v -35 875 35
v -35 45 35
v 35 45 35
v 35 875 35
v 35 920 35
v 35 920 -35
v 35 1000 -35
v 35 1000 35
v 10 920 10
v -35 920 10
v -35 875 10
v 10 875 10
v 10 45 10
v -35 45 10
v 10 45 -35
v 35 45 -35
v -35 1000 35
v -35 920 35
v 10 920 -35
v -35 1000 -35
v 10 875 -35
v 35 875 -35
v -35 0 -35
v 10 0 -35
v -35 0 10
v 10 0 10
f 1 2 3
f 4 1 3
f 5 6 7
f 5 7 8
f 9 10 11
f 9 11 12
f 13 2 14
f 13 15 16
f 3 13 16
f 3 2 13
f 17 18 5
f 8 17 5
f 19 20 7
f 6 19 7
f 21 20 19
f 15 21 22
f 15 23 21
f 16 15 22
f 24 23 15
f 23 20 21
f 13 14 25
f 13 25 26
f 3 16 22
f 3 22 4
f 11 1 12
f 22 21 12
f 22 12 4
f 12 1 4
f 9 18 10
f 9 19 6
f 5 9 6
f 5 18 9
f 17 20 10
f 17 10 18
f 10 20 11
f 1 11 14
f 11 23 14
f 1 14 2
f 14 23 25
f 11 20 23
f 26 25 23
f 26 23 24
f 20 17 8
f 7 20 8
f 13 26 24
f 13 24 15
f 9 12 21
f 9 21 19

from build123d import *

# Parameters (mm, degrees)
F0_W     = 70
F0_H     = 70
F1_DEPTH = 1000
F2_W     = 70
F2_H     = 45
F3_DEPTH = 25
F4_W     = 45
F4_H     = 45
F5_DEPTH = 25
F6_W     = 70
F6_H     = 45
F7_DEPTH = 25
F8_W     = 45
F8_H     = 45
F9_DEPTH = 25


with BuildPart() as f1:
    # F0 (on Front) → F1 (new body)
    with BuildSketch(Plane.XZ):
        Rectangle(F0_W, F0_H)
    extrude(amount=-F1_DEPTH)

    # F2 (on face) → F3 (cut)
    with BuildSketch(Plane.XY.offset(35)):
        with Locations((0, 22.5)):
            Rectangle(F2_W, F2_H)
    extrude(amount=-F3_DEPTH, mode=Mode.SUBTRACT)

    # F4 (on face) → F5 (cut)
    with BuildSketch(Plane.YZ.offset(35)):
        with Locations((22.5, -12.5)):
            Rectangle(F4_W, F4_H)
    extrude(amount=-F5_DEPTH, mode=Mode.SUBTRACT)

    # F6 (on face) → F7 (cut)
    with BuildSketch(Plane.XY.offset(35)):
        with Locations((0, 897.5)):
            Rectangle(F6_W, F6_H)
    extrude(amount=-F7_DEPTH, mode=Mode.SUBTRACT)

    # F8 (on face) → F9 (cut)
    with BuildSketch(Plane.YZ.offset(35)):
        with Locations((897.5, -12.5)):
            Rectangle(F8_W, F8_H)
    extrude(amount=-F9_DEPTH, mode=Mode.SUBTRACT)


solid = f1.part
